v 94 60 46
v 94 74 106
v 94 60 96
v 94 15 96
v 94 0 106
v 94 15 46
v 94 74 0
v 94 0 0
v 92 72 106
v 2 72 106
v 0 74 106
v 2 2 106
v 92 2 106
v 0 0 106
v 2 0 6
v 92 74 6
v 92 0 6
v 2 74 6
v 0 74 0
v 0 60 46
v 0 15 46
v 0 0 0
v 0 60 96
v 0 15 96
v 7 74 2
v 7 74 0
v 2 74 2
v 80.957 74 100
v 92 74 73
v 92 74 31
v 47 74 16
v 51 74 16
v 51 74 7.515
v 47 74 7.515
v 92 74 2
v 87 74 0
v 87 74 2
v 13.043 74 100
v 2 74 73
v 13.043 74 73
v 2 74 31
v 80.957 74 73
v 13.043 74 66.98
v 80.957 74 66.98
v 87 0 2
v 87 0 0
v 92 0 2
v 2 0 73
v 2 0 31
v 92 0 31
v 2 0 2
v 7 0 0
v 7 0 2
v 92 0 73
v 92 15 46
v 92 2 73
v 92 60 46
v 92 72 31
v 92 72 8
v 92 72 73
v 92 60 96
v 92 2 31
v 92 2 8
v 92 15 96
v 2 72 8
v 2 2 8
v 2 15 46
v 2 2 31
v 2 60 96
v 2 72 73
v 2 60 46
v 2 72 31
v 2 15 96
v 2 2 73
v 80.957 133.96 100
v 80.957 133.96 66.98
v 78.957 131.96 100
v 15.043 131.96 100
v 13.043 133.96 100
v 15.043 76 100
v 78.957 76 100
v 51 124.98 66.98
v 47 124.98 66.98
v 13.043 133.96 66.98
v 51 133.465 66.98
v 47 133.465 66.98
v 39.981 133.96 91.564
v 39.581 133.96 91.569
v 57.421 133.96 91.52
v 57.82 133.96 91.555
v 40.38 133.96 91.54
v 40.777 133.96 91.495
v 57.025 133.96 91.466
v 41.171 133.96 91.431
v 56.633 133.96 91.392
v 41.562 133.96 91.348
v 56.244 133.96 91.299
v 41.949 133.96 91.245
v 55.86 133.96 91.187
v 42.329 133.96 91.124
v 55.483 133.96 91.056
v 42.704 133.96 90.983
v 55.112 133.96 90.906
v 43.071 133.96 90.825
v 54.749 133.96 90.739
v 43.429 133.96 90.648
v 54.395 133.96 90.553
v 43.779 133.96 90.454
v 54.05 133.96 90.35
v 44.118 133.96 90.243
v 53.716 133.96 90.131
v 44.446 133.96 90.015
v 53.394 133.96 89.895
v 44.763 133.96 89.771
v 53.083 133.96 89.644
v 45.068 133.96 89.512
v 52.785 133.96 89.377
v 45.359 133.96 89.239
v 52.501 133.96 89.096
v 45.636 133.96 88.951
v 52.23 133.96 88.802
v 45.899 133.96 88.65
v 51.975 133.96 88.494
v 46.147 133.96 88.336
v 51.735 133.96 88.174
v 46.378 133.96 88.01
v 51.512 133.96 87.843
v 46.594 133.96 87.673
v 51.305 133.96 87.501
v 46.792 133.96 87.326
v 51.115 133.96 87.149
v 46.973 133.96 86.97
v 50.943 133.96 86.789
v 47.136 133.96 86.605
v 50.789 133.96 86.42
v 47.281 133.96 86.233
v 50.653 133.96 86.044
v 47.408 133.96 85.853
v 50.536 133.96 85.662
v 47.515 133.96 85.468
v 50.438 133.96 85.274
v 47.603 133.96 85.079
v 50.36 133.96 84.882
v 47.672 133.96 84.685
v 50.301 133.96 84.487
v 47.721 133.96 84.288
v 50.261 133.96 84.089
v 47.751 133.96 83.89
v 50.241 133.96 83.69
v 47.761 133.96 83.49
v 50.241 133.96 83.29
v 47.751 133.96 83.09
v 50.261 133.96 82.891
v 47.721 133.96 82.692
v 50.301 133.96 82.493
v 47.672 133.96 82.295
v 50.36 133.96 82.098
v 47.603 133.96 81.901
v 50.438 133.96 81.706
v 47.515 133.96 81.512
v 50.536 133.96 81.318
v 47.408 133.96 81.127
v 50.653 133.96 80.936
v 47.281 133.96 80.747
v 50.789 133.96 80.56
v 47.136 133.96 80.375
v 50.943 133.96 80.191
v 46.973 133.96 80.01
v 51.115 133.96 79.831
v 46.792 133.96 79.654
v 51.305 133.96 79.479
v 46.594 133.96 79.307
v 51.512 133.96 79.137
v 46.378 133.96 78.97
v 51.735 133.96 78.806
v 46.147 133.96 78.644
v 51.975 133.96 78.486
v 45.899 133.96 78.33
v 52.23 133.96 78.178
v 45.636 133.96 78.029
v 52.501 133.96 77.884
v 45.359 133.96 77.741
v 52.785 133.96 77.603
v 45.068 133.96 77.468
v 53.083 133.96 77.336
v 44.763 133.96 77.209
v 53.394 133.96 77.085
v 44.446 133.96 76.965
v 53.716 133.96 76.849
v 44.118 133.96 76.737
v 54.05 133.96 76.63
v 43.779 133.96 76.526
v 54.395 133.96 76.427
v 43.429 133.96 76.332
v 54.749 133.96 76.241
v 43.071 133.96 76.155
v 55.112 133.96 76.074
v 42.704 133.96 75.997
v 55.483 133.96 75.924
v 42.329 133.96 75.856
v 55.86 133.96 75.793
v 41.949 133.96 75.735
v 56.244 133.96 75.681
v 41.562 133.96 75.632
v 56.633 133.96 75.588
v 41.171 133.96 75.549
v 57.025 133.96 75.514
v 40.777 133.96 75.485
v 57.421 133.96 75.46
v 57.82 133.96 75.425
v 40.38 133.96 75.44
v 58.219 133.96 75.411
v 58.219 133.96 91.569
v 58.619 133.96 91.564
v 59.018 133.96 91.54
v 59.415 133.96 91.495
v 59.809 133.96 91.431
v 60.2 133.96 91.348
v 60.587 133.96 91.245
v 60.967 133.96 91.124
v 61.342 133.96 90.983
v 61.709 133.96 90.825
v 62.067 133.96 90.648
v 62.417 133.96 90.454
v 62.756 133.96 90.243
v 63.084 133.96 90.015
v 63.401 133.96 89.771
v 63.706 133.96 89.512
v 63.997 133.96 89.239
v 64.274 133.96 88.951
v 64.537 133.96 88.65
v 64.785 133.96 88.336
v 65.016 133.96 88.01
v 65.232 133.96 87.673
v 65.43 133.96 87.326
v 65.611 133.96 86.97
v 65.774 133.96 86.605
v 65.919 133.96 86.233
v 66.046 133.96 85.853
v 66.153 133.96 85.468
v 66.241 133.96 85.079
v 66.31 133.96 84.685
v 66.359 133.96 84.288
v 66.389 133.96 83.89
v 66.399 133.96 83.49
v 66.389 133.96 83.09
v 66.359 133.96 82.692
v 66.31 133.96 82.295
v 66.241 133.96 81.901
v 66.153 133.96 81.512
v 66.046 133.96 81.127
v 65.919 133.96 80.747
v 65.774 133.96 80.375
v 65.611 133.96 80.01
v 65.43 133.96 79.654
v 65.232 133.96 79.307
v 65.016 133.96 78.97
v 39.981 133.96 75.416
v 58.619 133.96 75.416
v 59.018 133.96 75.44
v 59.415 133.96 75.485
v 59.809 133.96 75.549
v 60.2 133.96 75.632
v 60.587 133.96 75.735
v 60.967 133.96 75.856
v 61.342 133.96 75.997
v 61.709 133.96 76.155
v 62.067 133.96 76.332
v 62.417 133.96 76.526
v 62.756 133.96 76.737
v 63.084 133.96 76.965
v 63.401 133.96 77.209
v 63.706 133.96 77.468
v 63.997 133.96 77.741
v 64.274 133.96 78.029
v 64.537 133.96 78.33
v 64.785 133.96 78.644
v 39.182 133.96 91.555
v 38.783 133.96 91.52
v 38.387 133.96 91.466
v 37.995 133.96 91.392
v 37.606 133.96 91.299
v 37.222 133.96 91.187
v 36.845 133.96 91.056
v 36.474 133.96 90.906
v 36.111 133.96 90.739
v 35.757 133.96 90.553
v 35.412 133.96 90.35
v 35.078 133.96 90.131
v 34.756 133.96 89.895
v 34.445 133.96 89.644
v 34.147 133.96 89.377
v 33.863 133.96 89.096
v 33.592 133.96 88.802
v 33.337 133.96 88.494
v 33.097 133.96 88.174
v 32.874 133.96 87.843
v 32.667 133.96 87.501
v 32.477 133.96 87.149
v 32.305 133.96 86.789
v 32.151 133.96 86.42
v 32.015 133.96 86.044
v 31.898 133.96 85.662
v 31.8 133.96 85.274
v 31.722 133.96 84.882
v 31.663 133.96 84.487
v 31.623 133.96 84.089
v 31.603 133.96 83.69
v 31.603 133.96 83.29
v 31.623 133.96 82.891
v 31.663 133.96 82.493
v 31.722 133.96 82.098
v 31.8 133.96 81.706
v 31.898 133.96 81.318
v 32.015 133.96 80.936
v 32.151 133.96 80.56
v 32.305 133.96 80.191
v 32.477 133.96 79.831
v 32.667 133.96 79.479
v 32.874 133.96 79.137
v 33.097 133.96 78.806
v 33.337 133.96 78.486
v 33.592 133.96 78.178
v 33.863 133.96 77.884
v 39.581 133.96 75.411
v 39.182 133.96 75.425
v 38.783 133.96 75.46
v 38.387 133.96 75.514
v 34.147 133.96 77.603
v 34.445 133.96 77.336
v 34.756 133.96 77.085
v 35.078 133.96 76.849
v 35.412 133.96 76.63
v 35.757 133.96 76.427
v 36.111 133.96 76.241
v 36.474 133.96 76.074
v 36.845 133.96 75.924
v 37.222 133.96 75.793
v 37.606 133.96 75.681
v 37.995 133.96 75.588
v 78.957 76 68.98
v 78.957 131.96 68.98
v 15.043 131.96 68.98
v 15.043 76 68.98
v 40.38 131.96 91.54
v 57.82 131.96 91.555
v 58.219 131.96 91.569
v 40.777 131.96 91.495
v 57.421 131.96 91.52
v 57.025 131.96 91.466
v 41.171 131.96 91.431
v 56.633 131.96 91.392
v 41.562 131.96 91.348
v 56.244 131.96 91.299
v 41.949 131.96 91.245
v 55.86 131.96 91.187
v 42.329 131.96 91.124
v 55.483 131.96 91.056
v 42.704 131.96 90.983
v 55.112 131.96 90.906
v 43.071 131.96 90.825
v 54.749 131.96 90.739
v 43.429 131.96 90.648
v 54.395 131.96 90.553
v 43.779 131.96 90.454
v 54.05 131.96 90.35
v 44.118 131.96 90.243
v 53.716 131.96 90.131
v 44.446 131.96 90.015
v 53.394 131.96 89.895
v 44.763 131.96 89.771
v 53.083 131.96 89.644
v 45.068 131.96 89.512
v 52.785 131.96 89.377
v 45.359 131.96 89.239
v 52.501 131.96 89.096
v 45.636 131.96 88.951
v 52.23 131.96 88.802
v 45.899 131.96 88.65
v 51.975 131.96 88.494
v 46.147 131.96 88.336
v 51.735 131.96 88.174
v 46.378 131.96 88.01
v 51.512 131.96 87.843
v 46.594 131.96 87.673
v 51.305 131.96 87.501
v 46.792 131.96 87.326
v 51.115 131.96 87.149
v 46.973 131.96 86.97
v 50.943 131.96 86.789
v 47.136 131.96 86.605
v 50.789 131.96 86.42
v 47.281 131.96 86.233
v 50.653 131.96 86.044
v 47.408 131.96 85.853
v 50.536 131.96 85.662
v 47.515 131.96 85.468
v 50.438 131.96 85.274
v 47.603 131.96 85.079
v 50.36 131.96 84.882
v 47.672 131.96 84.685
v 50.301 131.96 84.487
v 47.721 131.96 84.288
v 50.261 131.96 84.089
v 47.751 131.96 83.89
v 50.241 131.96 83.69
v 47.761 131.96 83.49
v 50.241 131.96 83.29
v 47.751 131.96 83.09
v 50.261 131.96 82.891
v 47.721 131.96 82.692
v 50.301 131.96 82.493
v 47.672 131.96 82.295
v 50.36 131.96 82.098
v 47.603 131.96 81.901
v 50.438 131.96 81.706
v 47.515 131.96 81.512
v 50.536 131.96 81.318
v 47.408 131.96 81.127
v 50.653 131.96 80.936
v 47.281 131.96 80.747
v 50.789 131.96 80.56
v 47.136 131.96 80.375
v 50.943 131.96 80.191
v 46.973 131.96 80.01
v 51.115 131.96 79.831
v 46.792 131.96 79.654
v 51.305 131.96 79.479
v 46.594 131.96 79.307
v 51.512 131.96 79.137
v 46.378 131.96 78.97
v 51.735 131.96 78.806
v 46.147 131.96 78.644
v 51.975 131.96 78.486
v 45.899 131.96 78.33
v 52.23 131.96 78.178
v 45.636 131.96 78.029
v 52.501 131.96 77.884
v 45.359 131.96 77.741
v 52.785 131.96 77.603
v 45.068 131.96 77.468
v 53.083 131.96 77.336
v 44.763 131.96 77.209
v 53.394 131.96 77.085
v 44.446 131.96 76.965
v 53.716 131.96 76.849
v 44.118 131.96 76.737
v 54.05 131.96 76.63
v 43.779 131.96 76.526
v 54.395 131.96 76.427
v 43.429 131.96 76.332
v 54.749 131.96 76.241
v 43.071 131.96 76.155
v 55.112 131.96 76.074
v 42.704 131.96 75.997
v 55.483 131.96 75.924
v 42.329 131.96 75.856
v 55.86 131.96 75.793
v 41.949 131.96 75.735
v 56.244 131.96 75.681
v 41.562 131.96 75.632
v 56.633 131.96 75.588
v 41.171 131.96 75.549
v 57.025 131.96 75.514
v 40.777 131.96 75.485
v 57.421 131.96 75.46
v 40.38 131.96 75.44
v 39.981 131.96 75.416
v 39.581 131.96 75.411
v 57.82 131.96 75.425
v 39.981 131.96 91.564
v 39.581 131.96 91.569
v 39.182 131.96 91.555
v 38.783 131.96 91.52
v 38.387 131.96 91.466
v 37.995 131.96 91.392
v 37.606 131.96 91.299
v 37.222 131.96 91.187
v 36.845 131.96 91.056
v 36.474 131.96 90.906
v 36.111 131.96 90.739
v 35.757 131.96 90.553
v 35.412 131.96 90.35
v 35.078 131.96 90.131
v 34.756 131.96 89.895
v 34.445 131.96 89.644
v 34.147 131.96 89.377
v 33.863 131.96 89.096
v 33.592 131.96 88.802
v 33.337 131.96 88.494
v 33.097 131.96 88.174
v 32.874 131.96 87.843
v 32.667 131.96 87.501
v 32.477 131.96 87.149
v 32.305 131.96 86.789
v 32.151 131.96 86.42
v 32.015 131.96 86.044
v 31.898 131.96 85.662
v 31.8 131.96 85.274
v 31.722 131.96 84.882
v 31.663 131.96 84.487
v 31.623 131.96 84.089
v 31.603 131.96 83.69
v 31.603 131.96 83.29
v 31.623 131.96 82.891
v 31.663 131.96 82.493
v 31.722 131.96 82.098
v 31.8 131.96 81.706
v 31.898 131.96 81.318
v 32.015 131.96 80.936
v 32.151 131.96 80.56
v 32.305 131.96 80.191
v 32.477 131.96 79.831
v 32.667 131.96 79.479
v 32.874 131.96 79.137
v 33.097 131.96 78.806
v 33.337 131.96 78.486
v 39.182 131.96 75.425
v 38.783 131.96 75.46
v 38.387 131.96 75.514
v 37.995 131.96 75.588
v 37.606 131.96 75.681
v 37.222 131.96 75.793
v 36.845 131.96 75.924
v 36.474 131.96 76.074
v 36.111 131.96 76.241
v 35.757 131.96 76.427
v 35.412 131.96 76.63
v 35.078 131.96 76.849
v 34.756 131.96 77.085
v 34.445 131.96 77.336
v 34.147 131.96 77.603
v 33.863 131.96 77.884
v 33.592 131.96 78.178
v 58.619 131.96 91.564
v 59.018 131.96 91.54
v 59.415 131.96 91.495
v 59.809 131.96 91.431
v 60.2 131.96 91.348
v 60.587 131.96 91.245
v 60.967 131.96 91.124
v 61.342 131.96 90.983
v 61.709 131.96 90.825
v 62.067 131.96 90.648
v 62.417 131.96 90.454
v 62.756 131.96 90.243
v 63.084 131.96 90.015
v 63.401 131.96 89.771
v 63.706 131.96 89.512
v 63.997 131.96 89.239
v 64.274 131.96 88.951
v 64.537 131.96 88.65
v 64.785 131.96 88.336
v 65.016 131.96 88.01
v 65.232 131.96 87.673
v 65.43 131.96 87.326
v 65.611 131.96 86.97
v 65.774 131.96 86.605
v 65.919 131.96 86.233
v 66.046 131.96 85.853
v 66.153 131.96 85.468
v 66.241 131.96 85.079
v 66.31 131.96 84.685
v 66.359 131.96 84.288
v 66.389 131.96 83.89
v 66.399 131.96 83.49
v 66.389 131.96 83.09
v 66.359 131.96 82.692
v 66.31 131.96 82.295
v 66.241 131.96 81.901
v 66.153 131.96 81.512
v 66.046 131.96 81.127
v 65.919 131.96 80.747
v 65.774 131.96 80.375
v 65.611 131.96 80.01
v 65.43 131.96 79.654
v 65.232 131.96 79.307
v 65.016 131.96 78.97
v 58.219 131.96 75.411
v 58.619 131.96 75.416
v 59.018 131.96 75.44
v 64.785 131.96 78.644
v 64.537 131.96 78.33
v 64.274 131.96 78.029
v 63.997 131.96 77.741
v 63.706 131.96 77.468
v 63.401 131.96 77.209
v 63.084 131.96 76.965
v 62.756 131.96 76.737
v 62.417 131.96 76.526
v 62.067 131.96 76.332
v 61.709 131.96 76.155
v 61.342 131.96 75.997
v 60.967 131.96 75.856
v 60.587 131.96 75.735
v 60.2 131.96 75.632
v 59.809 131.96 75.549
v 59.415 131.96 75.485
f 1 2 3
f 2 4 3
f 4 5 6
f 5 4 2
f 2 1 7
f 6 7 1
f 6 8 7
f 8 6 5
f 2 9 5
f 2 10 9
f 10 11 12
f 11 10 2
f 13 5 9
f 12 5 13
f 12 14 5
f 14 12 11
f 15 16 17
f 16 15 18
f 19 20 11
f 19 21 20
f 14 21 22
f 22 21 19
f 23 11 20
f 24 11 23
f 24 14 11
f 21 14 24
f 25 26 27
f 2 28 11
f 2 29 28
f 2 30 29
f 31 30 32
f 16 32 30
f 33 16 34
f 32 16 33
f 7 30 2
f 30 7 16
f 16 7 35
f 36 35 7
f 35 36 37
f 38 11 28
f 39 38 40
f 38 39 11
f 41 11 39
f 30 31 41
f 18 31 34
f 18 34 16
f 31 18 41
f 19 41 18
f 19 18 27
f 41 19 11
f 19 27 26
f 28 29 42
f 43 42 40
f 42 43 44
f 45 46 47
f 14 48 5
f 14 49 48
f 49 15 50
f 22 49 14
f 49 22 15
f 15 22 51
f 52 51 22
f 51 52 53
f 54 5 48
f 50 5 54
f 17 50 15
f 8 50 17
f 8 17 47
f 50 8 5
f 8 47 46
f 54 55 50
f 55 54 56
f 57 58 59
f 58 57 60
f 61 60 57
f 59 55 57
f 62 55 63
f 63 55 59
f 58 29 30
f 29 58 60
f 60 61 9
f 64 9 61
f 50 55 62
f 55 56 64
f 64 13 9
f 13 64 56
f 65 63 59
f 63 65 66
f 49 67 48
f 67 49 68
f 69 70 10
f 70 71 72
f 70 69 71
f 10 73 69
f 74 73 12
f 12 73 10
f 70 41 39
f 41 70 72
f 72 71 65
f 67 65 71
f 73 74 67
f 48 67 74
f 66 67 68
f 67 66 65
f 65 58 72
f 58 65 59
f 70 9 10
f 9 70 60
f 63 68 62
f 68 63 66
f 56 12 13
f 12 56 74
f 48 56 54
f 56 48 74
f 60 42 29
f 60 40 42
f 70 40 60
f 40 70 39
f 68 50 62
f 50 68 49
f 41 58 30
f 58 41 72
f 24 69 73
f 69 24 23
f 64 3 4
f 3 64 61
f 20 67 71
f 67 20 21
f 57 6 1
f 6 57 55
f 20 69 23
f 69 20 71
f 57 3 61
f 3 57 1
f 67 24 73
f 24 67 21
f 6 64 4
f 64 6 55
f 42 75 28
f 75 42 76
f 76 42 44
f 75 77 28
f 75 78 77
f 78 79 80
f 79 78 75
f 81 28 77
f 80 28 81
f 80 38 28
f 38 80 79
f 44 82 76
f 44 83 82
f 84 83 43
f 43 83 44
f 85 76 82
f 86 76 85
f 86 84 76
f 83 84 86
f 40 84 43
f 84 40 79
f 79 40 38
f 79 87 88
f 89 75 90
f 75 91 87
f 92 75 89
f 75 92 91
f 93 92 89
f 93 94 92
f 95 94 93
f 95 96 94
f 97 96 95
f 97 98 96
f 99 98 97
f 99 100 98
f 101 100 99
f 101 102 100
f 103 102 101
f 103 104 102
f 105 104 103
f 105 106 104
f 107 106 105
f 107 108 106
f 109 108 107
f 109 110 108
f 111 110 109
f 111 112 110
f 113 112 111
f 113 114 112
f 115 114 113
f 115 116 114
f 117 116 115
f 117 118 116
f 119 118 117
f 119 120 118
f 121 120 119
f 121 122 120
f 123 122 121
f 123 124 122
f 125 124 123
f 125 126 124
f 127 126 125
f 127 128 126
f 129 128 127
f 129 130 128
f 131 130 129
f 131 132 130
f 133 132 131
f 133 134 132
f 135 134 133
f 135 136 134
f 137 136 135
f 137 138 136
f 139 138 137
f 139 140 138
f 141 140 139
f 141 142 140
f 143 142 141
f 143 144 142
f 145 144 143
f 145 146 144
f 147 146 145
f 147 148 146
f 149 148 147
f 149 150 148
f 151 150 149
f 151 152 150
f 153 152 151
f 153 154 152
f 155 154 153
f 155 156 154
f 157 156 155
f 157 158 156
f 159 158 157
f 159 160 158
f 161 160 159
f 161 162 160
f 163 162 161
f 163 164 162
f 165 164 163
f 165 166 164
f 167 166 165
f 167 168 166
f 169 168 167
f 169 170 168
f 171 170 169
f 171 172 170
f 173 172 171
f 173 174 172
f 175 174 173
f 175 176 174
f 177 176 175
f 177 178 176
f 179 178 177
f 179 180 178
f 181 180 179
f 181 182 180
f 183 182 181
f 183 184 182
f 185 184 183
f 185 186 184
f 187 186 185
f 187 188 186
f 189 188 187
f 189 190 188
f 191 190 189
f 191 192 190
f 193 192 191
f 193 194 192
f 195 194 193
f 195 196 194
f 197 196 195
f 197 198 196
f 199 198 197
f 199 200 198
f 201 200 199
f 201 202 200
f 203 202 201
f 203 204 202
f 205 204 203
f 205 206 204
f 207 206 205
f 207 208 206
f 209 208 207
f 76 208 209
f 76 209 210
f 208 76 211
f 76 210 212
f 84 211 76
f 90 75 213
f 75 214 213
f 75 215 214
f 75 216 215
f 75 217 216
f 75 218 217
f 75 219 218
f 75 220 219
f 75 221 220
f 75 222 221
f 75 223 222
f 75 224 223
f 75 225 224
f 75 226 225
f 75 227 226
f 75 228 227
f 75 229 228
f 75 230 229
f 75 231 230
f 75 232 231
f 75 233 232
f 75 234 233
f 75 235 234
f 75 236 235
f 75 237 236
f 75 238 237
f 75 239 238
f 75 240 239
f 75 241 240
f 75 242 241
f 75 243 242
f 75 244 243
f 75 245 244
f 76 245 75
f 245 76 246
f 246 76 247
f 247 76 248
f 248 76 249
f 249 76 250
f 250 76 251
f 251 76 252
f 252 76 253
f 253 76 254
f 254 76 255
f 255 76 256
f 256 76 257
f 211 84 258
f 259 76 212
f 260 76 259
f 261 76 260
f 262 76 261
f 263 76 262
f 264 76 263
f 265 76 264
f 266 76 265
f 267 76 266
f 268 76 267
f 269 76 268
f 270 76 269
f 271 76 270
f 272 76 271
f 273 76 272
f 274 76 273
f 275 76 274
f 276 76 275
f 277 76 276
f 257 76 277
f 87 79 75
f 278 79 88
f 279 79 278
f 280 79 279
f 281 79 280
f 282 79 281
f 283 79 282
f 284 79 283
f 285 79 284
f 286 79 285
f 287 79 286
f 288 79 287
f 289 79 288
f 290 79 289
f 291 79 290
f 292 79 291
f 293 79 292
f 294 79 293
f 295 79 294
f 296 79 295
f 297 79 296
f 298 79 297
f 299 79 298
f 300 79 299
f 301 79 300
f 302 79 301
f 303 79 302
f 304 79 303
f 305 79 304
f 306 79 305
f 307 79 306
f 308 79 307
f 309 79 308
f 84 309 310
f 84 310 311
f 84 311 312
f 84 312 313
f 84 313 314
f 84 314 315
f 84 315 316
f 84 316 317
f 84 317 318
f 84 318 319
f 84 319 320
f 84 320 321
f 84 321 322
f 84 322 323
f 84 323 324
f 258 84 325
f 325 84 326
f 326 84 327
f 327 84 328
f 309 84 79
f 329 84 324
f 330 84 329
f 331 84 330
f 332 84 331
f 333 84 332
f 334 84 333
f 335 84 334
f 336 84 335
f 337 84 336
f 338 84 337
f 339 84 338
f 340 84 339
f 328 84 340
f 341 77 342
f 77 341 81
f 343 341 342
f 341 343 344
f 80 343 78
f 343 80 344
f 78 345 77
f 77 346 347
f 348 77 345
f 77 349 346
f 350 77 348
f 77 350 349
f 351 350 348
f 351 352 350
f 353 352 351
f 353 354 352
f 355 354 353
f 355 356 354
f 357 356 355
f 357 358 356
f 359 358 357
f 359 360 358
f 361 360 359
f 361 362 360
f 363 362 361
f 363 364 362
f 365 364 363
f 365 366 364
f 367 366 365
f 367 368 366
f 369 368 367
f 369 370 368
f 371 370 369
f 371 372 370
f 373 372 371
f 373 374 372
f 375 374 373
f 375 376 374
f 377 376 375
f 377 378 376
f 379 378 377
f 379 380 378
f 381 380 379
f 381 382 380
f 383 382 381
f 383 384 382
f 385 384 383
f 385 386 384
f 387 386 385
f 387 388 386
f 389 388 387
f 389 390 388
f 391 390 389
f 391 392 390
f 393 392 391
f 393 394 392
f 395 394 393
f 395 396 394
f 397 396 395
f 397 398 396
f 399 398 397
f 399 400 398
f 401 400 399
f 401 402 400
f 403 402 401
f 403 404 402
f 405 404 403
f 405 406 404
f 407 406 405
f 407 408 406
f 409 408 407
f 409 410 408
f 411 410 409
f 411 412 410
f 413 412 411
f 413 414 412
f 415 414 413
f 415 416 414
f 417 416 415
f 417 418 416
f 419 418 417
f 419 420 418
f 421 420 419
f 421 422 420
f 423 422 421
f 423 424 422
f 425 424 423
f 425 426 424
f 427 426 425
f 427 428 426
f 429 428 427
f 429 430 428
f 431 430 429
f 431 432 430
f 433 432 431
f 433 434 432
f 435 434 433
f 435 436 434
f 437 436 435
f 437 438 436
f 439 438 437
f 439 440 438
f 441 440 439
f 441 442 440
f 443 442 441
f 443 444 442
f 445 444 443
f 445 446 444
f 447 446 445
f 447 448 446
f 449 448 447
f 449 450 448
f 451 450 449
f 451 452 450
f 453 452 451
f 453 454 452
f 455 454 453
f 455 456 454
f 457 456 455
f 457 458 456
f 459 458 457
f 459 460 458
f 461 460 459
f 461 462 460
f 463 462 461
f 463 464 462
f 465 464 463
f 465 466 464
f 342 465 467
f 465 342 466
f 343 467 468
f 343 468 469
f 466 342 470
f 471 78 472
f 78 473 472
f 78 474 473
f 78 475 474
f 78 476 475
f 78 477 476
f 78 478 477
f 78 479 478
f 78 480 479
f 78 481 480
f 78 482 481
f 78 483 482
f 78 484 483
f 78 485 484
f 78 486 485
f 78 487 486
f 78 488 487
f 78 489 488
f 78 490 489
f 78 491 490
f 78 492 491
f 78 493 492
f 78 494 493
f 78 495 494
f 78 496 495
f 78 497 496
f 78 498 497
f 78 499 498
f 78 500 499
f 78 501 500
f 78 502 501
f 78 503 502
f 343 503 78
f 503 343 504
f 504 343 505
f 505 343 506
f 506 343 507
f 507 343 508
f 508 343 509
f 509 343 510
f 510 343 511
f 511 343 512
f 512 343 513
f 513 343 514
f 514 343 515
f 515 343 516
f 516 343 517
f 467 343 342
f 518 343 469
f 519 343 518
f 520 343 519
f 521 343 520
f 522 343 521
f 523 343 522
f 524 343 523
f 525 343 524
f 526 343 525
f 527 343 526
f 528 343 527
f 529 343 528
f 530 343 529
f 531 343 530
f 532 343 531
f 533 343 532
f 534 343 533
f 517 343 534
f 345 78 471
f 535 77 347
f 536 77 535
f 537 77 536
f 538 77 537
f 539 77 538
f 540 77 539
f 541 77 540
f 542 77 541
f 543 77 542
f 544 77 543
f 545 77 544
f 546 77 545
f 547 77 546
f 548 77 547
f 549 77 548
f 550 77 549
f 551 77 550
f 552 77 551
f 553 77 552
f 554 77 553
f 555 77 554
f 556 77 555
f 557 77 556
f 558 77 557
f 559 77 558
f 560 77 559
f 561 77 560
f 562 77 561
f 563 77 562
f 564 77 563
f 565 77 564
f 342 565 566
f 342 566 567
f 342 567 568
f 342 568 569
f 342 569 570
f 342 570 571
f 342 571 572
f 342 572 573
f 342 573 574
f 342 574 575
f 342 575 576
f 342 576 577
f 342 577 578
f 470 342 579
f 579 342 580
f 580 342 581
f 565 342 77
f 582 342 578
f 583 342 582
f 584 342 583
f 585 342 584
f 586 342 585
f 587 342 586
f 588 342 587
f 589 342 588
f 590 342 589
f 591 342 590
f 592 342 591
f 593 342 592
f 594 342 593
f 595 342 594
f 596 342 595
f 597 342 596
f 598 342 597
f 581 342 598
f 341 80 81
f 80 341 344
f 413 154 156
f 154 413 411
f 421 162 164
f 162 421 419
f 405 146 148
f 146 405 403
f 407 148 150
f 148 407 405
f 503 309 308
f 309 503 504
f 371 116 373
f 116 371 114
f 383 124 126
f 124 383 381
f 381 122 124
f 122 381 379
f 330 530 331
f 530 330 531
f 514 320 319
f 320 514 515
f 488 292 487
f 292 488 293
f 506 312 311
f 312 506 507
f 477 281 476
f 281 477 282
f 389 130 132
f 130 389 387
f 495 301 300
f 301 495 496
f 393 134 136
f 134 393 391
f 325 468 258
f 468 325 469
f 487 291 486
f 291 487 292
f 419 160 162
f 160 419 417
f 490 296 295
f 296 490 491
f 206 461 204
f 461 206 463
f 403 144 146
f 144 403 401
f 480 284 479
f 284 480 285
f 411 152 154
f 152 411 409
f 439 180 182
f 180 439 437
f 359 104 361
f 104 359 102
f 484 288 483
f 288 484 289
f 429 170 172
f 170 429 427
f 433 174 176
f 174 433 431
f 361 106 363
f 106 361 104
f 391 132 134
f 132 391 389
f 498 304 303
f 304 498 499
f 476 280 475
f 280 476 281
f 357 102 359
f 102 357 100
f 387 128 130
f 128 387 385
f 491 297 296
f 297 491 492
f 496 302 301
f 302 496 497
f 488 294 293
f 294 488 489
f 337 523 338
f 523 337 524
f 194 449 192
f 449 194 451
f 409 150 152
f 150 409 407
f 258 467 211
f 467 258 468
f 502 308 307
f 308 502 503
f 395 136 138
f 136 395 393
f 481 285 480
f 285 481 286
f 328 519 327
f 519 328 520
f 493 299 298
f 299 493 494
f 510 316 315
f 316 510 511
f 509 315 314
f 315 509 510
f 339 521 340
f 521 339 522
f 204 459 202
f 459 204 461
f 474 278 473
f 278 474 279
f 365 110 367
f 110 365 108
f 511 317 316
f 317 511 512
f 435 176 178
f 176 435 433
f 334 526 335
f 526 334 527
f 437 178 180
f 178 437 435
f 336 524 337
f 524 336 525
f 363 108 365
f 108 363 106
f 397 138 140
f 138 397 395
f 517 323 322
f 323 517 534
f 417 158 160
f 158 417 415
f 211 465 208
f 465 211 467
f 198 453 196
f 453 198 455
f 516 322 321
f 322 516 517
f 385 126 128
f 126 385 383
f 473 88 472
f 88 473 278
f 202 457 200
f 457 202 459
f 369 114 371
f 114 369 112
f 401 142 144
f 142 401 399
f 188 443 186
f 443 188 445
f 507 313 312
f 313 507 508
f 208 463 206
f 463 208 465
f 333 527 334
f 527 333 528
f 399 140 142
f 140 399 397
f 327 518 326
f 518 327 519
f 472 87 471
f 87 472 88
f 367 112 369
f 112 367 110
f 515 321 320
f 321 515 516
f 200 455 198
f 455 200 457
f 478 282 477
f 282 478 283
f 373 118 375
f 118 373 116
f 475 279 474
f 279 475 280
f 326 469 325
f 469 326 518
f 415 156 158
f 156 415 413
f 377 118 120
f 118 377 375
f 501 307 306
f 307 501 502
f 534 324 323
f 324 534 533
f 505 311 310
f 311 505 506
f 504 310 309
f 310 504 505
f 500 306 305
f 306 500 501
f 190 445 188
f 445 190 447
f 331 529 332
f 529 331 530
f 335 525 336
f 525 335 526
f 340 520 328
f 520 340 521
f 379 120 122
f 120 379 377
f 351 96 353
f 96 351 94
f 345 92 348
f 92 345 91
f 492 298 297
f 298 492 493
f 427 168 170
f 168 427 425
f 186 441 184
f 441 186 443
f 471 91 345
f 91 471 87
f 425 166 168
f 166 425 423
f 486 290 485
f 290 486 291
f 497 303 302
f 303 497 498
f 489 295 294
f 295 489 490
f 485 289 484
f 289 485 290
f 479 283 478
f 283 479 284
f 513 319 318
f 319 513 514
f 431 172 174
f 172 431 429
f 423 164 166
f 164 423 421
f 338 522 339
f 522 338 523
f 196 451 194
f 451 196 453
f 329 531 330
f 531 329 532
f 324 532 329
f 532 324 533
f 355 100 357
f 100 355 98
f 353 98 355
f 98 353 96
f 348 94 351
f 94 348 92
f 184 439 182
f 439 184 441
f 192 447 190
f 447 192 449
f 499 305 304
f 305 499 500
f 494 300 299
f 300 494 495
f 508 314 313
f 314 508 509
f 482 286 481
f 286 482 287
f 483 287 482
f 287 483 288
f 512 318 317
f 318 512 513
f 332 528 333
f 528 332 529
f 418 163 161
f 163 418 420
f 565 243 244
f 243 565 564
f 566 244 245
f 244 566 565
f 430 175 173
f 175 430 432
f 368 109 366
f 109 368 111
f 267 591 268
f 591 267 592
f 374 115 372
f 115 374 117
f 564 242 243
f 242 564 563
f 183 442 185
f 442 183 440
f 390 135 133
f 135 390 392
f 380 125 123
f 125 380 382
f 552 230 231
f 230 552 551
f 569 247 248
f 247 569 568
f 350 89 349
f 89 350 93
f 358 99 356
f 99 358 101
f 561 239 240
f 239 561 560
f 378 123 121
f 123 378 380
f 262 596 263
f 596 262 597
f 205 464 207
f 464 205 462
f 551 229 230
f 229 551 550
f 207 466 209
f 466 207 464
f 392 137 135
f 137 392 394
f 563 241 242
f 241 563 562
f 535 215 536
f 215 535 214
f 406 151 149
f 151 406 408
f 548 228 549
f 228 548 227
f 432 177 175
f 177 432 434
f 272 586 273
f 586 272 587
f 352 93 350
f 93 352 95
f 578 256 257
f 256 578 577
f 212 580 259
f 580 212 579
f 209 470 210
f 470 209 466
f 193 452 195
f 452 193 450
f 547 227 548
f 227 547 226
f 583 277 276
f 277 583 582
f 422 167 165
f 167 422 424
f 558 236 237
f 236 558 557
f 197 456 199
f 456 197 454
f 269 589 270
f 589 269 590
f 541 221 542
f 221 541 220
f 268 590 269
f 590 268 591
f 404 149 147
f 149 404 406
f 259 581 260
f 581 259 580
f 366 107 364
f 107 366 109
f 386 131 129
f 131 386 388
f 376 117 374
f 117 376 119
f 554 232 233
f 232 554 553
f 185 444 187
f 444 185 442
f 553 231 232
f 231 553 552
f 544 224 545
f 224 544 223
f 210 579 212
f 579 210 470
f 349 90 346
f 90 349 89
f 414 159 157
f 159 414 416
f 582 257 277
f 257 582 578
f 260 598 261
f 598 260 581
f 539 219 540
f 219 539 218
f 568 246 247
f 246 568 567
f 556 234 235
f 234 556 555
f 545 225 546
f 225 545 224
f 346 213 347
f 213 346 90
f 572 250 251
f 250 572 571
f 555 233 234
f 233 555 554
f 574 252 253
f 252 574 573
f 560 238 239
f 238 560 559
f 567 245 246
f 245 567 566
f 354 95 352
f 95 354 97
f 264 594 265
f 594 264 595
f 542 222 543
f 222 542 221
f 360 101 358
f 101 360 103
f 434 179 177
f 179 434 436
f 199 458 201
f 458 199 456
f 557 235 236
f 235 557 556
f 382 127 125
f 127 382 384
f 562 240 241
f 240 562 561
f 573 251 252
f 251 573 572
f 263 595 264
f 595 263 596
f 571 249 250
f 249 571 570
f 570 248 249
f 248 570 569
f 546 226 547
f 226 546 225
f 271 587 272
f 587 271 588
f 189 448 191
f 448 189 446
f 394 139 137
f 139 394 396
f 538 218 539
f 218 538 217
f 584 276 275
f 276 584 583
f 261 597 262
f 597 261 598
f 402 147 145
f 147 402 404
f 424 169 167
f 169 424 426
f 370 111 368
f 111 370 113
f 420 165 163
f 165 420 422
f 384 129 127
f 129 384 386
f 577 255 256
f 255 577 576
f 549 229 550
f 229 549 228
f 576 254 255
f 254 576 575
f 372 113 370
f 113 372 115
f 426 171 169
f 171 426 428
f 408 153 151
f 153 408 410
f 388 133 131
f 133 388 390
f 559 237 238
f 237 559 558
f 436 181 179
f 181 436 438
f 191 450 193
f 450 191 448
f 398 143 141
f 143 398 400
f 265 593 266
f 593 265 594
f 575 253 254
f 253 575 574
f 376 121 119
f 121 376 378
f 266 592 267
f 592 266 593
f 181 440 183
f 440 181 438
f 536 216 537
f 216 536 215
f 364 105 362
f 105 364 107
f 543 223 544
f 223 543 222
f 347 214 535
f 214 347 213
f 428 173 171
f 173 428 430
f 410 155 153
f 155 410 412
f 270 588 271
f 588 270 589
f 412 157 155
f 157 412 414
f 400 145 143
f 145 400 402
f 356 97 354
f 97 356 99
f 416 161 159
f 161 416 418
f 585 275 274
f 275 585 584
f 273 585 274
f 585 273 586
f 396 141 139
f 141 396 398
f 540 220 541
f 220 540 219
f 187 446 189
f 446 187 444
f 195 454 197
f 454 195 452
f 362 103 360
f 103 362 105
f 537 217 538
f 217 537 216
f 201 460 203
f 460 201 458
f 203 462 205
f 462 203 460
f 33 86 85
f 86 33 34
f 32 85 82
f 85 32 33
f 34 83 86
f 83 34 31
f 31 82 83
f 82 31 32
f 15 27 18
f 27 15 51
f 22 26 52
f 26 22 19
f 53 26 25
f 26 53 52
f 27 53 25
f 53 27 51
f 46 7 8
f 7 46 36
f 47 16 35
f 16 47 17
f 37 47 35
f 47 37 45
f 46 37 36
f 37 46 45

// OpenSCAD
// file: support_angle.scad
module support_angle(length = 150, width = 10, rot_vec = [90,0,0]) {
    rotate(rot_vec)
    difference() {
        cube([width, length, 4]);
        
        translate([10,-10,-1])
        rotate([0,0,45])
        cube([10, 30, 6]);
        
        translate([-10,length - 10,-1])
        rotate([0,0,-45])
        cube([10, 30, 6]);
    }
}
support_angle();
// file: tobsun_parts.scad
$fa=1;
$fs=0.4;

////////////////////////////////////////////////
tobsun_shelf_width = 67.914;
tobsun_shelf_length = 59.96;
tobsun_shelf_height = 33.02;

cutout_radius = 8.08;
wall_thickness = 2;

module tobsun_tray() {
    difference() {
        translate([0, 0, 0])
        cube([tobsun_shelf_width, tobsun_shelf_length, tobsun_shelf_height]);
        
        // cut out
        translate([wall_thickness, wall_thickness, wall_thickness])
        cube([tobsun_shelf_width - 2 * wall_thickness, tobsun_shelf_length - 2 * wall_thickness, tobsun_shelf_height]);
        
        // tobsun tray wire cutout
        translate([tobsun_shelf_width / 3 + 4, tobsun_shelf_length + wall_thickness, tobsun_shelf_height / 2])
        rotate([90,0,0])
        cylinder(h=4 * wall_thickness, r=cutout_radius);
        
        // tobsun tray wire cutout
        translate([tobsun_shelf_width * 2/3, tobsun_shelf_length + wall_thickness, tobsun_shelf_height / 2])
        rotate([90,0,0])
        cylinder(h=4 * wall_thickness, r=cutout_radius);
    }
}
//tobsun_tray();

////////////////////////////////////////////////
module tobsun_chassis_cutout() {
    tobsun_chassis_cutout_width = 73.914;
    tobsun_chassis_cutout_length = 71.12;
    tobsun_chassis_cutout_height = 35.56;
    
    // tobsun chassis shelf cutout
    translate([0,0,0])
    cube([tobsun_chassis_cutout_width,tobsun_chassis_cutout_length,tobsun_chassis_cutout_height]);
    
    // tobsun chassis wire cutout left
    translate([60.96,22.86,12.7])
    rotate([0,90,0])
    cylinder(h=1, r=.2);

    // tobsun chassis wire cutout right
    translate([-12.7,22.86,12.7])
    rotate([0,90,0])
    cylinder(h=1, r=.2);
}
//tobsun_chassis_cutout();
// main file
include <tobsun_parts.scad>
use <support_angle.scad>

main_box_x = 94;
main_box_y = 74;
main_box_z = 100;
wall_thickness = 2;

translate([0,0,6])
difference() {
// battery box
cube([main_box_x, main_box_y, main_box_z]);

// battery box cutout    
translate([wall_thickness, wall_thickness, wall_thickness])
cube([main_box_x - 2 * wall_thickness, main_box_y - 2 * wall_thickness, main_box_z]);

// front back windows
translate([2, -2, 25])
cube([90, 78, 42]);

// size windows
translate([-2, 15, 40])
cube([98, 45, 50]);
}

// tobsun
translate([main_box_x / 2 - tobsun_shelf_width / 2, main_box_y, main_box_z - tobsun_shelf_height])
tobsun_tray();

// tobsun support
translate([main_box_x / 2, main_box_y - 11, 5])
support_angle(102, 6, [90,45,90]);

// rail
translate([0, 0, 0])
cube([2, main_box_y, 7]);
cube([7, main_box_y, 2]);

translate([main_box_x - 2, 0, 0]) 
cube([2, main_box_y, 7]);
translate([main_box_x - 7, 0 ,0])
cube([7, main_box_y, 2]);
